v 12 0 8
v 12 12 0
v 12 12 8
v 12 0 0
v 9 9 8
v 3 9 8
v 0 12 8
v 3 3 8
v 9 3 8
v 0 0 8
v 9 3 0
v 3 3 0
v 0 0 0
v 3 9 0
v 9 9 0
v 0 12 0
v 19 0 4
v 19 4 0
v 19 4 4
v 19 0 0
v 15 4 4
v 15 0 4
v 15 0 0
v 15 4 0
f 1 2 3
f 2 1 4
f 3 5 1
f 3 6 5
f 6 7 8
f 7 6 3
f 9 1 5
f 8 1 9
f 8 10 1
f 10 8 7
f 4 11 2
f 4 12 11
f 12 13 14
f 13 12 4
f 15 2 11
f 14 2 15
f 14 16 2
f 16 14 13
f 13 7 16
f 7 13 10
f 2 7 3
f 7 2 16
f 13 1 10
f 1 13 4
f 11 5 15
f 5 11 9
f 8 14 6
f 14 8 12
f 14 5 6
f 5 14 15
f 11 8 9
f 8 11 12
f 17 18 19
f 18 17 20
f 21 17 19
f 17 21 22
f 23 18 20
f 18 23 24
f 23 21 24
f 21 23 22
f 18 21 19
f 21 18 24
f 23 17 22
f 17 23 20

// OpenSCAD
color([0.4,0.7,1]) difference() {
  cube([12,12,8]);
  translate([3,3,-1]) cube([6,6,10]);
}
color([0.5,0.85,0.5]) translate([15,0,0]) cube([4,4,4]);
